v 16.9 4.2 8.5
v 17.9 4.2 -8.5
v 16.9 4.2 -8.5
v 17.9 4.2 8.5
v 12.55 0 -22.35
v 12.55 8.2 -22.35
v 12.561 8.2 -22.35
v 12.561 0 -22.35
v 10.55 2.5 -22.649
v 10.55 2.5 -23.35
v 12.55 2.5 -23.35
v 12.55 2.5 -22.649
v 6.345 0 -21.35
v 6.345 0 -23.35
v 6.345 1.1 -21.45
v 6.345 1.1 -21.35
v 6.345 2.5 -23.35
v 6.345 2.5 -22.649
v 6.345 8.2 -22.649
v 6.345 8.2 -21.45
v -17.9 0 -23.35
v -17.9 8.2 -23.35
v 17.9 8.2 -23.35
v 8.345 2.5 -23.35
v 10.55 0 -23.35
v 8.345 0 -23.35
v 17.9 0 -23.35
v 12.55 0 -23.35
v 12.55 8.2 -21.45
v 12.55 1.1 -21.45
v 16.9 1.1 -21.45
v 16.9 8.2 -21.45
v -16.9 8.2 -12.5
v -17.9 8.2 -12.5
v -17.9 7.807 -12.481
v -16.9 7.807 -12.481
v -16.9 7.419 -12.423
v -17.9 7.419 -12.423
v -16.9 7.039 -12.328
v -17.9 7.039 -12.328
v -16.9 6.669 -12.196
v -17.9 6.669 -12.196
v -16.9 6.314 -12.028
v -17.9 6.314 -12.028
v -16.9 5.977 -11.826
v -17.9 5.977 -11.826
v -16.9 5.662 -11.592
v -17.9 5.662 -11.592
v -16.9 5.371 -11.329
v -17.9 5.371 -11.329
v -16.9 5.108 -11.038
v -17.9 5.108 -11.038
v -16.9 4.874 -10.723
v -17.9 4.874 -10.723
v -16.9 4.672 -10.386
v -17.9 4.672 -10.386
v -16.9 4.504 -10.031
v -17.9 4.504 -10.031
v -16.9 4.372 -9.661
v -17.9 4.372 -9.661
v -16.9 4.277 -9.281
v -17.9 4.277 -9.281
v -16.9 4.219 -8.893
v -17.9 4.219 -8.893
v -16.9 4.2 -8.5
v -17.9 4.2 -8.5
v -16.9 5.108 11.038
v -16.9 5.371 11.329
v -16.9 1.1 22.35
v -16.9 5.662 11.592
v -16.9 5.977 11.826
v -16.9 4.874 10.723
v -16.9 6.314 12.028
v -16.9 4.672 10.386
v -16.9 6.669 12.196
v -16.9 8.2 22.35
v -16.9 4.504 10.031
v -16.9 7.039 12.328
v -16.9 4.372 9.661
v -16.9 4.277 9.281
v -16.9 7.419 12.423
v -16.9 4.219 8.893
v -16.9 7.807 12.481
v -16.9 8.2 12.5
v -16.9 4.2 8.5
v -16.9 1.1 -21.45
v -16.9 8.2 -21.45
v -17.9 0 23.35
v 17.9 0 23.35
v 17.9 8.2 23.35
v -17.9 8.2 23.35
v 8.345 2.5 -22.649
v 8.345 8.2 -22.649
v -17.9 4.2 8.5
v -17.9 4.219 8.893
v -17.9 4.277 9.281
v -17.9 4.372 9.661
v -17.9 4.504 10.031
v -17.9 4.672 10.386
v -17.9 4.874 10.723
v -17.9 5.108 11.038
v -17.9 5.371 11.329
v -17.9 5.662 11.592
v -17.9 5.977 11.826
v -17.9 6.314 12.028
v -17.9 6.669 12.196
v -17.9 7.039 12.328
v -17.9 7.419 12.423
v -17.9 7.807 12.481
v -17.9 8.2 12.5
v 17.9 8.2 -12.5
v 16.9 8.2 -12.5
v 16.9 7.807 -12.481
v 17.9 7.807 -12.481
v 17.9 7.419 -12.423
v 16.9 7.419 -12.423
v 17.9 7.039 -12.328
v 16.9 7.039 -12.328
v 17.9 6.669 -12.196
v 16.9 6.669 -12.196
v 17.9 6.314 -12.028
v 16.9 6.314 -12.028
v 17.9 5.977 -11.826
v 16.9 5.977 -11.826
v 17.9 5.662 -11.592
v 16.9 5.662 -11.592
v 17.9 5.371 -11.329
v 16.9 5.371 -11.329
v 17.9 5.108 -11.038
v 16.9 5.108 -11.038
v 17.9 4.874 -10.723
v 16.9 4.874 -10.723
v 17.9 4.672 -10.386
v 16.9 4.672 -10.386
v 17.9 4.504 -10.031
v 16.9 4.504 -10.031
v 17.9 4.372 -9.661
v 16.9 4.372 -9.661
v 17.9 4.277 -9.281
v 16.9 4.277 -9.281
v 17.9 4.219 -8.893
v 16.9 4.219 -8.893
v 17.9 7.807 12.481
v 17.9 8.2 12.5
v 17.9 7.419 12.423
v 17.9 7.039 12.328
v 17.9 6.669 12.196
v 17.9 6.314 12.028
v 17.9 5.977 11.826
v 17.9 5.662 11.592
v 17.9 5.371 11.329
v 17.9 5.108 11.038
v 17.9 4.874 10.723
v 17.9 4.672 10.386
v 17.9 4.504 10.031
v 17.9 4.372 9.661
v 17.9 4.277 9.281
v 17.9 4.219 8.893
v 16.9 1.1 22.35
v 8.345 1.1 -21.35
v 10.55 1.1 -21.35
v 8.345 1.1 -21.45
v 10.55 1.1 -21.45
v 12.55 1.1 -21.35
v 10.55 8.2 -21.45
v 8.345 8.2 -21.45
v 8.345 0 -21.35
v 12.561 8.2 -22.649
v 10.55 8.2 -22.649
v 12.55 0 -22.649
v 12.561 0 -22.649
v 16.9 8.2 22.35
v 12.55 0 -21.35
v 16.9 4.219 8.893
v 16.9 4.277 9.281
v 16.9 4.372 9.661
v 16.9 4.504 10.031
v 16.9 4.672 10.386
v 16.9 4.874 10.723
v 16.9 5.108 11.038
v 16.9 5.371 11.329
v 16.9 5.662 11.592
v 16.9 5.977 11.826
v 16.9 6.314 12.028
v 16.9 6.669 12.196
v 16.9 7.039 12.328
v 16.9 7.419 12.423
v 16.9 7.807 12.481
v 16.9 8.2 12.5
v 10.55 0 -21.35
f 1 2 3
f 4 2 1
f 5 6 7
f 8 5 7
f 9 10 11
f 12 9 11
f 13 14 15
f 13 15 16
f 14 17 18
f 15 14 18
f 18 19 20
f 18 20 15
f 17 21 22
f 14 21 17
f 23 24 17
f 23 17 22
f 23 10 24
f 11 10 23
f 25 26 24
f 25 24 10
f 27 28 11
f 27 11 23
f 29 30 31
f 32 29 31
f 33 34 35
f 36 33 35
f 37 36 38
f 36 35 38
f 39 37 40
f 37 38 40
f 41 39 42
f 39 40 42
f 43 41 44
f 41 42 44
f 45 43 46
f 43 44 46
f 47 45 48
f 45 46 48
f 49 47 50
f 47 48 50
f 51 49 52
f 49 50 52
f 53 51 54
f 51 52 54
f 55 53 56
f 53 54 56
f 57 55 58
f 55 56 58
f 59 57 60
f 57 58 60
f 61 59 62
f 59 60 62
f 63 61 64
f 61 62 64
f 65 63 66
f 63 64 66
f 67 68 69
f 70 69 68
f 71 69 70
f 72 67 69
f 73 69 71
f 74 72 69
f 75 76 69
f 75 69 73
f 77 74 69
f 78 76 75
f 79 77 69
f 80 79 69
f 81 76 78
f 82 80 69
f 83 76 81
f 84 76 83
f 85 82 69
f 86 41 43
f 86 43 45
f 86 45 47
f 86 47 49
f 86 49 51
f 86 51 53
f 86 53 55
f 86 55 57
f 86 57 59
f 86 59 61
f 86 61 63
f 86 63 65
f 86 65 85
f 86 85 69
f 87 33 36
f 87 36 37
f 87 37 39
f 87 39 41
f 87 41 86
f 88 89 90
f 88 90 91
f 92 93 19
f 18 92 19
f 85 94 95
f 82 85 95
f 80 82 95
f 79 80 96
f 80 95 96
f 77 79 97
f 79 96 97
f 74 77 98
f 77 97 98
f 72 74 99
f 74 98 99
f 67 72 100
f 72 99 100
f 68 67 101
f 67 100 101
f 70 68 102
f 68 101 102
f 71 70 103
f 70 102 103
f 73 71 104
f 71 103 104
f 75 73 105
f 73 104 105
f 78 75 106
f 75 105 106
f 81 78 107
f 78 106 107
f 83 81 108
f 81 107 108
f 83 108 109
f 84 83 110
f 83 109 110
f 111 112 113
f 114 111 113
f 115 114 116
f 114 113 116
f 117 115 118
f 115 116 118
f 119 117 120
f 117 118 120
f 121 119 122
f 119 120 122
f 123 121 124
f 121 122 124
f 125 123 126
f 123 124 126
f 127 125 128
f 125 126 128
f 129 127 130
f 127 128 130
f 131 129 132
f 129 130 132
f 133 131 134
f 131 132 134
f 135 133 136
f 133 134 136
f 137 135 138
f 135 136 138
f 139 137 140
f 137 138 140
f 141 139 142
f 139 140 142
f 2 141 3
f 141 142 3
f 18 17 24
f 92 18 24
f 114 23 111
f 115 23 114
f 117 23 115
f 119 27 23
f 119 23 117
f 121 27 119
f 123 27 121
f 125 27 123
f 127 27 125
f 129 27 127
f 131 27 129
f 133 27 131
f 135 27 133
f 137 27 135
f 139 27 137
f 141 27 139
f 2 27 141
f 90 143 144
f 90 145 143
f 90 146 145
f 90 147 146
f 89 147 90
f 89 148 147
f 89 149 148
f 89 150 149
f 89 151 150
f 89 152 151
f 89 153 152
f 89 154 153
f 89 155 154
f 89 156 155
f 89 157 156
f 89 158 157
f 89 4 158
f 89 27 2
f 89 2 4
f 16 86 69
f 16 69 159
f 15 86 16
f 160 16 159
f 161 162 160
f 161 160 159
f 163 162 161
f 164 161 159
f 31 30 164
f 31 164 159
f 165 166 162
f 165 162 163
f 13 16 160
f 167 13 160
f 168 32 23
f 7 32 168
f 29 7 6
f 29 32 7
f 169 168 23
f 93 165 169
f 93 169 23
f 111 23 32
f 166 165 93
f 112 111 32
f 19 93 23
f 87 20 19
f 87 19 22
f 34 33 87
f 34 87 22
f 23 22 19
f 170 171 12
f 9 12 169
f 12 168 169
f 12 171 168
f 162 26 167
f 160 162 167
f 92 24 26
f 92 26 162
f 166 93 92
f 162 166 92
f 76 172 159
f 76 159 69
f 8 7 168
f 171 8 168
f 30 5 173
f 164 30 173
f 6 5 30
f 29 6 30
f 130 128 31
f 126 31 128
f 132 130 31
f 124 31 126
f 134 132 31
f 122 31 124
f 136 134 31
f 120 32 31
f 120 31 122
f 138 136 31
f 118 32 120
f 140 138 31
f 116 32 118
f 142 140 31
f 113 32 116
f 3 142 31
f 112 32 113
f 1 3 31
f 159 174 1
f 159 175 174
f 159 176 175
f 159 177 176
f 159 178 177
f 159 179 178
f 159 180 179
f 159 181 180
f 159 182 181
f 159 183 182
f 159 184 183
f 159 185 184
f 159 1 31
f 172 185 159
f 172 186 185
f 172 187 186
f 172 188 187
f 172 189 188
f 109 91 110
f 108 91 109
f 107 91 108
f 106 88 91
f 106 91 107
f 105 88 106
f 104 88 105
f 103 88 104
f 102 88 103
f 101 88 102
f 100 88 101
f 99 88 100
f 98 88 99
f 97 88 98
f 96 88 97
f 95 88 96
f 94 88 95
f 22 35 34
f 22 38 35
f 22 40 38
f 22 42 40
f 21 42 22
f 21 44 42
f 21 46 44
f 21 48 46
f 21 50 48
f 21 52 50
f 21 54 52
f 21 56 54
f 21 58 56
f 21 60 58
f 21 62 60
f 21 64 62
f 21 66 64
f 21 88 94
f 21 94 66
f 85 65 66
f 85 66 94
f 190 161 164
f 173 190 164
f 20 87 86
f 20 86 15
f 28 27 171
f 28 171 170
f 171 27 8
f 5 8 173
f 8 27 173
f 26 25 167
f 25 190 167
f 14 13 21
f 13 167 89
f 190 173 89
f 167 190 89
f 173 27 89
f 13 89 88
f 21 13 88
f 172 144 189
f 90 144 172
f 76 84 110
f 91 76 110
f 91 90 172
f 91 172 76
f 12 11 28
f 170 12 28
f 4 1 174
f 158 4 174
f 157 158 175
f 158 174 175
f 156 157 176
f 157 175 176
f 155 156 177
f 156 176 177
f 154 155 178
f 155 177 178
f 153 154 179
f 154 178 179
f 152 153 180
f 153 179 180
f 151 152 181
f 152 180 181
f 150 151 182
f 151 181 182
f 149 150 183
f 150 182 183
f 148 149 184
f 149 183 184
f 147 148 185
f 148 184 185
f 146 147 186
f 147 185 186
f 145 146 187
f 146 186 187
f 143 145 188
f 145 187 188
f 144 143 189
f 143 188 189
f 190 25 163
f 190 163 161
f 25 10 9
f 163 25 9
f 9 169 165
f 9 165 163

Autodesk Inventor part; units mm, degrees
ref_plane "YZ Plane" through (0, 0, 0) normal (1, 0, 0) x (0, 1, 0)
ref_plane "XZ Plane" through (0, 0, 0) normal (0, 1, 0) x (-1, 0, 0)
ref_plane "XY Plane" through (0, 0, 0) normal (0, 0, 1) x (1, 0, 0)
sketch "Sketch1" plane through (0, 0, 0) normal (0, 1, 0) x (-1, 0, 0)
  line L0 (17.9, -23.35) -> (-17.9, -23.35)
  line L1 (-17.9, -23.35) -> (-17.9, 23.35)
  line L2 (-17.9, 23.35) -> (17.9, 23.35)
  line L3 (17.9, 23.35) -> (17.9, -23.35)
  point P0 (0, 0)
  dimension "d0" = 35.8
  dimension "d1" = 46.7
  dimension "d2" = 23.35
  dimension "d3" = 17.9
extrude "Extrusion1" add sketch "Sketch1" along normal blind 8.2
sketch "Sketch2" plane through (0, 8.2, 0) normal (0, 1, 0) x (1, 0, 0)
  line L0 (-16.8, -22.25) -> (16.8, -22.25)
  line L1 (16.8, -22.25) -> (16.8, 21.35)
  line L2 (16.8, 21.35) -> (-16.8, 21.35)
  line L3 (-16.8, 21.35) -> (-16.8, -22.25)
  line L4 (-17.9, -23.35) -> (17.9, -23.35) projected
  line L5 (17.9, -23.35) -> (17.9, 23.35) projected
  line L6 (-17.9, 23.35) -> (-17.9, -23.35) projected
  line L7 (17.9, 23.35) -> (-17.9, 23.35) projected
  point P0 (0, 0)
  dimension "d6" = 1.1
  dimension "d7" = 1.1
  dimension "d8" = 1.1
  dimension "d9" = 2
extrude "Extrusion2" cut sketch "Sketch2" against normal blind 7.1 contours L3 L2 L1 L0
sketch "Sketch6" plane through (17.9, 0, 23.35) normal (1, 0, 0) x (0, 0, -1)
  line L0 (1.1, 8.2) -> (44.7, 8.2) projected
  line L1 (10.85, 8.2) -> (35.85, 8.2)
  line L2 (35.85, 8.2) -> (35.85, 4.2)
  line L3 (35.85, 4.2) -> (10.85, 4.2)
  line L4 (10.85, 4.2) -> (10.85, 8.2)
  line L5 (46.7, 0) -> (46.7, 8.2) projected
  point P0 (23.35, 0)
  dimension "d34" = 25
  dimension "d35" = 10.85
  dimension "d36" = 4
extrude "Extrusion6" cut sketch "Sketch6" against normal through all
fillet "Fillet2" radius 4 4 edges at (17.35, 4.2, 12.5) (-17.35, 4.2, 12.5) (-17.35, 4.2, -12.5) (17.35, 4.2, -12.5)
sketch "Sketch9" plane through (0, 8.2, 0) normal (0, 1, 0) x (1, 0, 0)
  point P0 (0, 0)
sketch "Sketch10" plane through (0, 8.2, 0) normal (0, 1, 0) x (1, 0, 0)
  line L0 (-16.8, 21.35) -> (16.8, 21.35) projected
  line L1 (12.55, 21.35) -> (10.55, 21.35)
  line L2 (10.55, 21.35) -> (10.55, 22.35)
  line L3 (10.55, 22.35) -> (12.55, 22.35)
  line L4 (12.55, 22.35) -> (12.55, 21.35)
  line L5 (8.345, 21.35) -> (6.345, 21.35)
  line L6 (6.345, 21.35) -> (6.345, 22.35)
  line L7 (6.345, 22.35) -> (8.345, 22.35)
  line L8 (8.345, 22.35) -> (8.345, 21.35)
  line L9 (17.9, 23.35) -> (-17.9, 23.35) projected
  line L10 (17.9, 12.5) -> (17.9, 23.35) projected
  point P0 (0, 0)
  dimension "d51" = 2
  dimension "d52" = 2
  dimension "d53" = 2.205
  dimension "d54" = 1
  dimension "d55" = 5.35
extrude "Extrusion9" cut sketch "Sketch10" against normal through all
sketch "Sketch12" plane through (0, 8.2, 0) normal (0, 1, 0) x (1, 0, 0)
  line L0 (6.345, 22.35) -> (8.345, 22.35) projected
  line L1 (6.345, 22.35) -> (8.345, 22.35)
  line L2 (8.345, 22.35) -> (8.345, 22.649)
  line L3 (8.345, 22.649) -> (6.345, 22.649)
  line L4 (6.345, 22.649) -> (6.345, 22.35)
  line L5 (10.55, 22.35) -> (12.55, 22.35) projected
  line L6 (10.55, 22.35) -> (12.5613, 22.35)
  line L7 (12.5613, 22.35) -> (12.5613, 22.649)
  line L8 (12.5613, 22.649) -> (10.55, 22.649)
  line L9 (10.55, 22.649) -> (10.55, 22.35)
  point P0 (0, 0)
extrude "Extrusion11" cut sketch "Sketch12" against normal through all
sketch "Sketch13" plane through (17.9, 0, -23.35) normal (0, 0, -1) x (-1, 0, 0)
  line L0 (7.35, 0) -> (5.35, 0) projected
  line L1 (7.35, 8.2) -> (7.35, 1.1) projected
  line L2 (5.35, 0) -> (7.35, 0)
  line L3 (7.35, 0) -> (7.35, 2.5)
  line L4 (7.35, 2.5) -> (5.35, 2.5)
  line L5 (5.35, 2.5) -> (5.35, 0)
  line L6 (11.555, 0) -> (9.555, 0) projected
  line L7 (11.555, 8.2) -> (11.555, 1.1) projected
  line L8 (9.555, 0) -> (11.555, 0)
  line L9 (11.555, 0) -> (11.555, 2.5)
  line L10 (11.555, 2.5) -> (9.555, 2.5)
  line L11 (9.555, 2.5) -> (9.555, 0)
  point P0 (17.9, 0)
  dimension "d66" = 2.5
extrude "Extrusion12" cut sketch "Sketch13" against normal up to surface (2 mm away)
sketch "Sketch14" plane through (0, 8.2, 0) normal (0, 1, 0) x (1, 0, 0)
  line L0 (-16.9, 21.45) -> (16.9, 21.45)
  line L1 (16.9, 21.45) -> (16.9, -22.35)
  line L2 (16.9, -22.35) -> (-16.9, -22.35)
  line L3 (-16.9, -22.35) -> (-16.9, 21.45)
  line L4 (16.8, -22.25) -> (-16.8, -22.25) projected
  line L5 (-16.8, -22.25) -> (-16.8, -12.5) projected
  line L6 (-16.8, 21.35) -> (6.345, 21.35) projected
  line L7 (16.8, 21.35) -> (16.8, 12.5) projected
  point P0 (0, 0)
  dimension "d69" = 0.1
  dimension "d70" = 0.1
  dimension "d71" = 0.1
  dimension "d72" = 0.1
extrude "Extrusion13" cut sketch "Sketch14" against normal up to surface (7.1 mm away)
properties part number "battery-cover"
